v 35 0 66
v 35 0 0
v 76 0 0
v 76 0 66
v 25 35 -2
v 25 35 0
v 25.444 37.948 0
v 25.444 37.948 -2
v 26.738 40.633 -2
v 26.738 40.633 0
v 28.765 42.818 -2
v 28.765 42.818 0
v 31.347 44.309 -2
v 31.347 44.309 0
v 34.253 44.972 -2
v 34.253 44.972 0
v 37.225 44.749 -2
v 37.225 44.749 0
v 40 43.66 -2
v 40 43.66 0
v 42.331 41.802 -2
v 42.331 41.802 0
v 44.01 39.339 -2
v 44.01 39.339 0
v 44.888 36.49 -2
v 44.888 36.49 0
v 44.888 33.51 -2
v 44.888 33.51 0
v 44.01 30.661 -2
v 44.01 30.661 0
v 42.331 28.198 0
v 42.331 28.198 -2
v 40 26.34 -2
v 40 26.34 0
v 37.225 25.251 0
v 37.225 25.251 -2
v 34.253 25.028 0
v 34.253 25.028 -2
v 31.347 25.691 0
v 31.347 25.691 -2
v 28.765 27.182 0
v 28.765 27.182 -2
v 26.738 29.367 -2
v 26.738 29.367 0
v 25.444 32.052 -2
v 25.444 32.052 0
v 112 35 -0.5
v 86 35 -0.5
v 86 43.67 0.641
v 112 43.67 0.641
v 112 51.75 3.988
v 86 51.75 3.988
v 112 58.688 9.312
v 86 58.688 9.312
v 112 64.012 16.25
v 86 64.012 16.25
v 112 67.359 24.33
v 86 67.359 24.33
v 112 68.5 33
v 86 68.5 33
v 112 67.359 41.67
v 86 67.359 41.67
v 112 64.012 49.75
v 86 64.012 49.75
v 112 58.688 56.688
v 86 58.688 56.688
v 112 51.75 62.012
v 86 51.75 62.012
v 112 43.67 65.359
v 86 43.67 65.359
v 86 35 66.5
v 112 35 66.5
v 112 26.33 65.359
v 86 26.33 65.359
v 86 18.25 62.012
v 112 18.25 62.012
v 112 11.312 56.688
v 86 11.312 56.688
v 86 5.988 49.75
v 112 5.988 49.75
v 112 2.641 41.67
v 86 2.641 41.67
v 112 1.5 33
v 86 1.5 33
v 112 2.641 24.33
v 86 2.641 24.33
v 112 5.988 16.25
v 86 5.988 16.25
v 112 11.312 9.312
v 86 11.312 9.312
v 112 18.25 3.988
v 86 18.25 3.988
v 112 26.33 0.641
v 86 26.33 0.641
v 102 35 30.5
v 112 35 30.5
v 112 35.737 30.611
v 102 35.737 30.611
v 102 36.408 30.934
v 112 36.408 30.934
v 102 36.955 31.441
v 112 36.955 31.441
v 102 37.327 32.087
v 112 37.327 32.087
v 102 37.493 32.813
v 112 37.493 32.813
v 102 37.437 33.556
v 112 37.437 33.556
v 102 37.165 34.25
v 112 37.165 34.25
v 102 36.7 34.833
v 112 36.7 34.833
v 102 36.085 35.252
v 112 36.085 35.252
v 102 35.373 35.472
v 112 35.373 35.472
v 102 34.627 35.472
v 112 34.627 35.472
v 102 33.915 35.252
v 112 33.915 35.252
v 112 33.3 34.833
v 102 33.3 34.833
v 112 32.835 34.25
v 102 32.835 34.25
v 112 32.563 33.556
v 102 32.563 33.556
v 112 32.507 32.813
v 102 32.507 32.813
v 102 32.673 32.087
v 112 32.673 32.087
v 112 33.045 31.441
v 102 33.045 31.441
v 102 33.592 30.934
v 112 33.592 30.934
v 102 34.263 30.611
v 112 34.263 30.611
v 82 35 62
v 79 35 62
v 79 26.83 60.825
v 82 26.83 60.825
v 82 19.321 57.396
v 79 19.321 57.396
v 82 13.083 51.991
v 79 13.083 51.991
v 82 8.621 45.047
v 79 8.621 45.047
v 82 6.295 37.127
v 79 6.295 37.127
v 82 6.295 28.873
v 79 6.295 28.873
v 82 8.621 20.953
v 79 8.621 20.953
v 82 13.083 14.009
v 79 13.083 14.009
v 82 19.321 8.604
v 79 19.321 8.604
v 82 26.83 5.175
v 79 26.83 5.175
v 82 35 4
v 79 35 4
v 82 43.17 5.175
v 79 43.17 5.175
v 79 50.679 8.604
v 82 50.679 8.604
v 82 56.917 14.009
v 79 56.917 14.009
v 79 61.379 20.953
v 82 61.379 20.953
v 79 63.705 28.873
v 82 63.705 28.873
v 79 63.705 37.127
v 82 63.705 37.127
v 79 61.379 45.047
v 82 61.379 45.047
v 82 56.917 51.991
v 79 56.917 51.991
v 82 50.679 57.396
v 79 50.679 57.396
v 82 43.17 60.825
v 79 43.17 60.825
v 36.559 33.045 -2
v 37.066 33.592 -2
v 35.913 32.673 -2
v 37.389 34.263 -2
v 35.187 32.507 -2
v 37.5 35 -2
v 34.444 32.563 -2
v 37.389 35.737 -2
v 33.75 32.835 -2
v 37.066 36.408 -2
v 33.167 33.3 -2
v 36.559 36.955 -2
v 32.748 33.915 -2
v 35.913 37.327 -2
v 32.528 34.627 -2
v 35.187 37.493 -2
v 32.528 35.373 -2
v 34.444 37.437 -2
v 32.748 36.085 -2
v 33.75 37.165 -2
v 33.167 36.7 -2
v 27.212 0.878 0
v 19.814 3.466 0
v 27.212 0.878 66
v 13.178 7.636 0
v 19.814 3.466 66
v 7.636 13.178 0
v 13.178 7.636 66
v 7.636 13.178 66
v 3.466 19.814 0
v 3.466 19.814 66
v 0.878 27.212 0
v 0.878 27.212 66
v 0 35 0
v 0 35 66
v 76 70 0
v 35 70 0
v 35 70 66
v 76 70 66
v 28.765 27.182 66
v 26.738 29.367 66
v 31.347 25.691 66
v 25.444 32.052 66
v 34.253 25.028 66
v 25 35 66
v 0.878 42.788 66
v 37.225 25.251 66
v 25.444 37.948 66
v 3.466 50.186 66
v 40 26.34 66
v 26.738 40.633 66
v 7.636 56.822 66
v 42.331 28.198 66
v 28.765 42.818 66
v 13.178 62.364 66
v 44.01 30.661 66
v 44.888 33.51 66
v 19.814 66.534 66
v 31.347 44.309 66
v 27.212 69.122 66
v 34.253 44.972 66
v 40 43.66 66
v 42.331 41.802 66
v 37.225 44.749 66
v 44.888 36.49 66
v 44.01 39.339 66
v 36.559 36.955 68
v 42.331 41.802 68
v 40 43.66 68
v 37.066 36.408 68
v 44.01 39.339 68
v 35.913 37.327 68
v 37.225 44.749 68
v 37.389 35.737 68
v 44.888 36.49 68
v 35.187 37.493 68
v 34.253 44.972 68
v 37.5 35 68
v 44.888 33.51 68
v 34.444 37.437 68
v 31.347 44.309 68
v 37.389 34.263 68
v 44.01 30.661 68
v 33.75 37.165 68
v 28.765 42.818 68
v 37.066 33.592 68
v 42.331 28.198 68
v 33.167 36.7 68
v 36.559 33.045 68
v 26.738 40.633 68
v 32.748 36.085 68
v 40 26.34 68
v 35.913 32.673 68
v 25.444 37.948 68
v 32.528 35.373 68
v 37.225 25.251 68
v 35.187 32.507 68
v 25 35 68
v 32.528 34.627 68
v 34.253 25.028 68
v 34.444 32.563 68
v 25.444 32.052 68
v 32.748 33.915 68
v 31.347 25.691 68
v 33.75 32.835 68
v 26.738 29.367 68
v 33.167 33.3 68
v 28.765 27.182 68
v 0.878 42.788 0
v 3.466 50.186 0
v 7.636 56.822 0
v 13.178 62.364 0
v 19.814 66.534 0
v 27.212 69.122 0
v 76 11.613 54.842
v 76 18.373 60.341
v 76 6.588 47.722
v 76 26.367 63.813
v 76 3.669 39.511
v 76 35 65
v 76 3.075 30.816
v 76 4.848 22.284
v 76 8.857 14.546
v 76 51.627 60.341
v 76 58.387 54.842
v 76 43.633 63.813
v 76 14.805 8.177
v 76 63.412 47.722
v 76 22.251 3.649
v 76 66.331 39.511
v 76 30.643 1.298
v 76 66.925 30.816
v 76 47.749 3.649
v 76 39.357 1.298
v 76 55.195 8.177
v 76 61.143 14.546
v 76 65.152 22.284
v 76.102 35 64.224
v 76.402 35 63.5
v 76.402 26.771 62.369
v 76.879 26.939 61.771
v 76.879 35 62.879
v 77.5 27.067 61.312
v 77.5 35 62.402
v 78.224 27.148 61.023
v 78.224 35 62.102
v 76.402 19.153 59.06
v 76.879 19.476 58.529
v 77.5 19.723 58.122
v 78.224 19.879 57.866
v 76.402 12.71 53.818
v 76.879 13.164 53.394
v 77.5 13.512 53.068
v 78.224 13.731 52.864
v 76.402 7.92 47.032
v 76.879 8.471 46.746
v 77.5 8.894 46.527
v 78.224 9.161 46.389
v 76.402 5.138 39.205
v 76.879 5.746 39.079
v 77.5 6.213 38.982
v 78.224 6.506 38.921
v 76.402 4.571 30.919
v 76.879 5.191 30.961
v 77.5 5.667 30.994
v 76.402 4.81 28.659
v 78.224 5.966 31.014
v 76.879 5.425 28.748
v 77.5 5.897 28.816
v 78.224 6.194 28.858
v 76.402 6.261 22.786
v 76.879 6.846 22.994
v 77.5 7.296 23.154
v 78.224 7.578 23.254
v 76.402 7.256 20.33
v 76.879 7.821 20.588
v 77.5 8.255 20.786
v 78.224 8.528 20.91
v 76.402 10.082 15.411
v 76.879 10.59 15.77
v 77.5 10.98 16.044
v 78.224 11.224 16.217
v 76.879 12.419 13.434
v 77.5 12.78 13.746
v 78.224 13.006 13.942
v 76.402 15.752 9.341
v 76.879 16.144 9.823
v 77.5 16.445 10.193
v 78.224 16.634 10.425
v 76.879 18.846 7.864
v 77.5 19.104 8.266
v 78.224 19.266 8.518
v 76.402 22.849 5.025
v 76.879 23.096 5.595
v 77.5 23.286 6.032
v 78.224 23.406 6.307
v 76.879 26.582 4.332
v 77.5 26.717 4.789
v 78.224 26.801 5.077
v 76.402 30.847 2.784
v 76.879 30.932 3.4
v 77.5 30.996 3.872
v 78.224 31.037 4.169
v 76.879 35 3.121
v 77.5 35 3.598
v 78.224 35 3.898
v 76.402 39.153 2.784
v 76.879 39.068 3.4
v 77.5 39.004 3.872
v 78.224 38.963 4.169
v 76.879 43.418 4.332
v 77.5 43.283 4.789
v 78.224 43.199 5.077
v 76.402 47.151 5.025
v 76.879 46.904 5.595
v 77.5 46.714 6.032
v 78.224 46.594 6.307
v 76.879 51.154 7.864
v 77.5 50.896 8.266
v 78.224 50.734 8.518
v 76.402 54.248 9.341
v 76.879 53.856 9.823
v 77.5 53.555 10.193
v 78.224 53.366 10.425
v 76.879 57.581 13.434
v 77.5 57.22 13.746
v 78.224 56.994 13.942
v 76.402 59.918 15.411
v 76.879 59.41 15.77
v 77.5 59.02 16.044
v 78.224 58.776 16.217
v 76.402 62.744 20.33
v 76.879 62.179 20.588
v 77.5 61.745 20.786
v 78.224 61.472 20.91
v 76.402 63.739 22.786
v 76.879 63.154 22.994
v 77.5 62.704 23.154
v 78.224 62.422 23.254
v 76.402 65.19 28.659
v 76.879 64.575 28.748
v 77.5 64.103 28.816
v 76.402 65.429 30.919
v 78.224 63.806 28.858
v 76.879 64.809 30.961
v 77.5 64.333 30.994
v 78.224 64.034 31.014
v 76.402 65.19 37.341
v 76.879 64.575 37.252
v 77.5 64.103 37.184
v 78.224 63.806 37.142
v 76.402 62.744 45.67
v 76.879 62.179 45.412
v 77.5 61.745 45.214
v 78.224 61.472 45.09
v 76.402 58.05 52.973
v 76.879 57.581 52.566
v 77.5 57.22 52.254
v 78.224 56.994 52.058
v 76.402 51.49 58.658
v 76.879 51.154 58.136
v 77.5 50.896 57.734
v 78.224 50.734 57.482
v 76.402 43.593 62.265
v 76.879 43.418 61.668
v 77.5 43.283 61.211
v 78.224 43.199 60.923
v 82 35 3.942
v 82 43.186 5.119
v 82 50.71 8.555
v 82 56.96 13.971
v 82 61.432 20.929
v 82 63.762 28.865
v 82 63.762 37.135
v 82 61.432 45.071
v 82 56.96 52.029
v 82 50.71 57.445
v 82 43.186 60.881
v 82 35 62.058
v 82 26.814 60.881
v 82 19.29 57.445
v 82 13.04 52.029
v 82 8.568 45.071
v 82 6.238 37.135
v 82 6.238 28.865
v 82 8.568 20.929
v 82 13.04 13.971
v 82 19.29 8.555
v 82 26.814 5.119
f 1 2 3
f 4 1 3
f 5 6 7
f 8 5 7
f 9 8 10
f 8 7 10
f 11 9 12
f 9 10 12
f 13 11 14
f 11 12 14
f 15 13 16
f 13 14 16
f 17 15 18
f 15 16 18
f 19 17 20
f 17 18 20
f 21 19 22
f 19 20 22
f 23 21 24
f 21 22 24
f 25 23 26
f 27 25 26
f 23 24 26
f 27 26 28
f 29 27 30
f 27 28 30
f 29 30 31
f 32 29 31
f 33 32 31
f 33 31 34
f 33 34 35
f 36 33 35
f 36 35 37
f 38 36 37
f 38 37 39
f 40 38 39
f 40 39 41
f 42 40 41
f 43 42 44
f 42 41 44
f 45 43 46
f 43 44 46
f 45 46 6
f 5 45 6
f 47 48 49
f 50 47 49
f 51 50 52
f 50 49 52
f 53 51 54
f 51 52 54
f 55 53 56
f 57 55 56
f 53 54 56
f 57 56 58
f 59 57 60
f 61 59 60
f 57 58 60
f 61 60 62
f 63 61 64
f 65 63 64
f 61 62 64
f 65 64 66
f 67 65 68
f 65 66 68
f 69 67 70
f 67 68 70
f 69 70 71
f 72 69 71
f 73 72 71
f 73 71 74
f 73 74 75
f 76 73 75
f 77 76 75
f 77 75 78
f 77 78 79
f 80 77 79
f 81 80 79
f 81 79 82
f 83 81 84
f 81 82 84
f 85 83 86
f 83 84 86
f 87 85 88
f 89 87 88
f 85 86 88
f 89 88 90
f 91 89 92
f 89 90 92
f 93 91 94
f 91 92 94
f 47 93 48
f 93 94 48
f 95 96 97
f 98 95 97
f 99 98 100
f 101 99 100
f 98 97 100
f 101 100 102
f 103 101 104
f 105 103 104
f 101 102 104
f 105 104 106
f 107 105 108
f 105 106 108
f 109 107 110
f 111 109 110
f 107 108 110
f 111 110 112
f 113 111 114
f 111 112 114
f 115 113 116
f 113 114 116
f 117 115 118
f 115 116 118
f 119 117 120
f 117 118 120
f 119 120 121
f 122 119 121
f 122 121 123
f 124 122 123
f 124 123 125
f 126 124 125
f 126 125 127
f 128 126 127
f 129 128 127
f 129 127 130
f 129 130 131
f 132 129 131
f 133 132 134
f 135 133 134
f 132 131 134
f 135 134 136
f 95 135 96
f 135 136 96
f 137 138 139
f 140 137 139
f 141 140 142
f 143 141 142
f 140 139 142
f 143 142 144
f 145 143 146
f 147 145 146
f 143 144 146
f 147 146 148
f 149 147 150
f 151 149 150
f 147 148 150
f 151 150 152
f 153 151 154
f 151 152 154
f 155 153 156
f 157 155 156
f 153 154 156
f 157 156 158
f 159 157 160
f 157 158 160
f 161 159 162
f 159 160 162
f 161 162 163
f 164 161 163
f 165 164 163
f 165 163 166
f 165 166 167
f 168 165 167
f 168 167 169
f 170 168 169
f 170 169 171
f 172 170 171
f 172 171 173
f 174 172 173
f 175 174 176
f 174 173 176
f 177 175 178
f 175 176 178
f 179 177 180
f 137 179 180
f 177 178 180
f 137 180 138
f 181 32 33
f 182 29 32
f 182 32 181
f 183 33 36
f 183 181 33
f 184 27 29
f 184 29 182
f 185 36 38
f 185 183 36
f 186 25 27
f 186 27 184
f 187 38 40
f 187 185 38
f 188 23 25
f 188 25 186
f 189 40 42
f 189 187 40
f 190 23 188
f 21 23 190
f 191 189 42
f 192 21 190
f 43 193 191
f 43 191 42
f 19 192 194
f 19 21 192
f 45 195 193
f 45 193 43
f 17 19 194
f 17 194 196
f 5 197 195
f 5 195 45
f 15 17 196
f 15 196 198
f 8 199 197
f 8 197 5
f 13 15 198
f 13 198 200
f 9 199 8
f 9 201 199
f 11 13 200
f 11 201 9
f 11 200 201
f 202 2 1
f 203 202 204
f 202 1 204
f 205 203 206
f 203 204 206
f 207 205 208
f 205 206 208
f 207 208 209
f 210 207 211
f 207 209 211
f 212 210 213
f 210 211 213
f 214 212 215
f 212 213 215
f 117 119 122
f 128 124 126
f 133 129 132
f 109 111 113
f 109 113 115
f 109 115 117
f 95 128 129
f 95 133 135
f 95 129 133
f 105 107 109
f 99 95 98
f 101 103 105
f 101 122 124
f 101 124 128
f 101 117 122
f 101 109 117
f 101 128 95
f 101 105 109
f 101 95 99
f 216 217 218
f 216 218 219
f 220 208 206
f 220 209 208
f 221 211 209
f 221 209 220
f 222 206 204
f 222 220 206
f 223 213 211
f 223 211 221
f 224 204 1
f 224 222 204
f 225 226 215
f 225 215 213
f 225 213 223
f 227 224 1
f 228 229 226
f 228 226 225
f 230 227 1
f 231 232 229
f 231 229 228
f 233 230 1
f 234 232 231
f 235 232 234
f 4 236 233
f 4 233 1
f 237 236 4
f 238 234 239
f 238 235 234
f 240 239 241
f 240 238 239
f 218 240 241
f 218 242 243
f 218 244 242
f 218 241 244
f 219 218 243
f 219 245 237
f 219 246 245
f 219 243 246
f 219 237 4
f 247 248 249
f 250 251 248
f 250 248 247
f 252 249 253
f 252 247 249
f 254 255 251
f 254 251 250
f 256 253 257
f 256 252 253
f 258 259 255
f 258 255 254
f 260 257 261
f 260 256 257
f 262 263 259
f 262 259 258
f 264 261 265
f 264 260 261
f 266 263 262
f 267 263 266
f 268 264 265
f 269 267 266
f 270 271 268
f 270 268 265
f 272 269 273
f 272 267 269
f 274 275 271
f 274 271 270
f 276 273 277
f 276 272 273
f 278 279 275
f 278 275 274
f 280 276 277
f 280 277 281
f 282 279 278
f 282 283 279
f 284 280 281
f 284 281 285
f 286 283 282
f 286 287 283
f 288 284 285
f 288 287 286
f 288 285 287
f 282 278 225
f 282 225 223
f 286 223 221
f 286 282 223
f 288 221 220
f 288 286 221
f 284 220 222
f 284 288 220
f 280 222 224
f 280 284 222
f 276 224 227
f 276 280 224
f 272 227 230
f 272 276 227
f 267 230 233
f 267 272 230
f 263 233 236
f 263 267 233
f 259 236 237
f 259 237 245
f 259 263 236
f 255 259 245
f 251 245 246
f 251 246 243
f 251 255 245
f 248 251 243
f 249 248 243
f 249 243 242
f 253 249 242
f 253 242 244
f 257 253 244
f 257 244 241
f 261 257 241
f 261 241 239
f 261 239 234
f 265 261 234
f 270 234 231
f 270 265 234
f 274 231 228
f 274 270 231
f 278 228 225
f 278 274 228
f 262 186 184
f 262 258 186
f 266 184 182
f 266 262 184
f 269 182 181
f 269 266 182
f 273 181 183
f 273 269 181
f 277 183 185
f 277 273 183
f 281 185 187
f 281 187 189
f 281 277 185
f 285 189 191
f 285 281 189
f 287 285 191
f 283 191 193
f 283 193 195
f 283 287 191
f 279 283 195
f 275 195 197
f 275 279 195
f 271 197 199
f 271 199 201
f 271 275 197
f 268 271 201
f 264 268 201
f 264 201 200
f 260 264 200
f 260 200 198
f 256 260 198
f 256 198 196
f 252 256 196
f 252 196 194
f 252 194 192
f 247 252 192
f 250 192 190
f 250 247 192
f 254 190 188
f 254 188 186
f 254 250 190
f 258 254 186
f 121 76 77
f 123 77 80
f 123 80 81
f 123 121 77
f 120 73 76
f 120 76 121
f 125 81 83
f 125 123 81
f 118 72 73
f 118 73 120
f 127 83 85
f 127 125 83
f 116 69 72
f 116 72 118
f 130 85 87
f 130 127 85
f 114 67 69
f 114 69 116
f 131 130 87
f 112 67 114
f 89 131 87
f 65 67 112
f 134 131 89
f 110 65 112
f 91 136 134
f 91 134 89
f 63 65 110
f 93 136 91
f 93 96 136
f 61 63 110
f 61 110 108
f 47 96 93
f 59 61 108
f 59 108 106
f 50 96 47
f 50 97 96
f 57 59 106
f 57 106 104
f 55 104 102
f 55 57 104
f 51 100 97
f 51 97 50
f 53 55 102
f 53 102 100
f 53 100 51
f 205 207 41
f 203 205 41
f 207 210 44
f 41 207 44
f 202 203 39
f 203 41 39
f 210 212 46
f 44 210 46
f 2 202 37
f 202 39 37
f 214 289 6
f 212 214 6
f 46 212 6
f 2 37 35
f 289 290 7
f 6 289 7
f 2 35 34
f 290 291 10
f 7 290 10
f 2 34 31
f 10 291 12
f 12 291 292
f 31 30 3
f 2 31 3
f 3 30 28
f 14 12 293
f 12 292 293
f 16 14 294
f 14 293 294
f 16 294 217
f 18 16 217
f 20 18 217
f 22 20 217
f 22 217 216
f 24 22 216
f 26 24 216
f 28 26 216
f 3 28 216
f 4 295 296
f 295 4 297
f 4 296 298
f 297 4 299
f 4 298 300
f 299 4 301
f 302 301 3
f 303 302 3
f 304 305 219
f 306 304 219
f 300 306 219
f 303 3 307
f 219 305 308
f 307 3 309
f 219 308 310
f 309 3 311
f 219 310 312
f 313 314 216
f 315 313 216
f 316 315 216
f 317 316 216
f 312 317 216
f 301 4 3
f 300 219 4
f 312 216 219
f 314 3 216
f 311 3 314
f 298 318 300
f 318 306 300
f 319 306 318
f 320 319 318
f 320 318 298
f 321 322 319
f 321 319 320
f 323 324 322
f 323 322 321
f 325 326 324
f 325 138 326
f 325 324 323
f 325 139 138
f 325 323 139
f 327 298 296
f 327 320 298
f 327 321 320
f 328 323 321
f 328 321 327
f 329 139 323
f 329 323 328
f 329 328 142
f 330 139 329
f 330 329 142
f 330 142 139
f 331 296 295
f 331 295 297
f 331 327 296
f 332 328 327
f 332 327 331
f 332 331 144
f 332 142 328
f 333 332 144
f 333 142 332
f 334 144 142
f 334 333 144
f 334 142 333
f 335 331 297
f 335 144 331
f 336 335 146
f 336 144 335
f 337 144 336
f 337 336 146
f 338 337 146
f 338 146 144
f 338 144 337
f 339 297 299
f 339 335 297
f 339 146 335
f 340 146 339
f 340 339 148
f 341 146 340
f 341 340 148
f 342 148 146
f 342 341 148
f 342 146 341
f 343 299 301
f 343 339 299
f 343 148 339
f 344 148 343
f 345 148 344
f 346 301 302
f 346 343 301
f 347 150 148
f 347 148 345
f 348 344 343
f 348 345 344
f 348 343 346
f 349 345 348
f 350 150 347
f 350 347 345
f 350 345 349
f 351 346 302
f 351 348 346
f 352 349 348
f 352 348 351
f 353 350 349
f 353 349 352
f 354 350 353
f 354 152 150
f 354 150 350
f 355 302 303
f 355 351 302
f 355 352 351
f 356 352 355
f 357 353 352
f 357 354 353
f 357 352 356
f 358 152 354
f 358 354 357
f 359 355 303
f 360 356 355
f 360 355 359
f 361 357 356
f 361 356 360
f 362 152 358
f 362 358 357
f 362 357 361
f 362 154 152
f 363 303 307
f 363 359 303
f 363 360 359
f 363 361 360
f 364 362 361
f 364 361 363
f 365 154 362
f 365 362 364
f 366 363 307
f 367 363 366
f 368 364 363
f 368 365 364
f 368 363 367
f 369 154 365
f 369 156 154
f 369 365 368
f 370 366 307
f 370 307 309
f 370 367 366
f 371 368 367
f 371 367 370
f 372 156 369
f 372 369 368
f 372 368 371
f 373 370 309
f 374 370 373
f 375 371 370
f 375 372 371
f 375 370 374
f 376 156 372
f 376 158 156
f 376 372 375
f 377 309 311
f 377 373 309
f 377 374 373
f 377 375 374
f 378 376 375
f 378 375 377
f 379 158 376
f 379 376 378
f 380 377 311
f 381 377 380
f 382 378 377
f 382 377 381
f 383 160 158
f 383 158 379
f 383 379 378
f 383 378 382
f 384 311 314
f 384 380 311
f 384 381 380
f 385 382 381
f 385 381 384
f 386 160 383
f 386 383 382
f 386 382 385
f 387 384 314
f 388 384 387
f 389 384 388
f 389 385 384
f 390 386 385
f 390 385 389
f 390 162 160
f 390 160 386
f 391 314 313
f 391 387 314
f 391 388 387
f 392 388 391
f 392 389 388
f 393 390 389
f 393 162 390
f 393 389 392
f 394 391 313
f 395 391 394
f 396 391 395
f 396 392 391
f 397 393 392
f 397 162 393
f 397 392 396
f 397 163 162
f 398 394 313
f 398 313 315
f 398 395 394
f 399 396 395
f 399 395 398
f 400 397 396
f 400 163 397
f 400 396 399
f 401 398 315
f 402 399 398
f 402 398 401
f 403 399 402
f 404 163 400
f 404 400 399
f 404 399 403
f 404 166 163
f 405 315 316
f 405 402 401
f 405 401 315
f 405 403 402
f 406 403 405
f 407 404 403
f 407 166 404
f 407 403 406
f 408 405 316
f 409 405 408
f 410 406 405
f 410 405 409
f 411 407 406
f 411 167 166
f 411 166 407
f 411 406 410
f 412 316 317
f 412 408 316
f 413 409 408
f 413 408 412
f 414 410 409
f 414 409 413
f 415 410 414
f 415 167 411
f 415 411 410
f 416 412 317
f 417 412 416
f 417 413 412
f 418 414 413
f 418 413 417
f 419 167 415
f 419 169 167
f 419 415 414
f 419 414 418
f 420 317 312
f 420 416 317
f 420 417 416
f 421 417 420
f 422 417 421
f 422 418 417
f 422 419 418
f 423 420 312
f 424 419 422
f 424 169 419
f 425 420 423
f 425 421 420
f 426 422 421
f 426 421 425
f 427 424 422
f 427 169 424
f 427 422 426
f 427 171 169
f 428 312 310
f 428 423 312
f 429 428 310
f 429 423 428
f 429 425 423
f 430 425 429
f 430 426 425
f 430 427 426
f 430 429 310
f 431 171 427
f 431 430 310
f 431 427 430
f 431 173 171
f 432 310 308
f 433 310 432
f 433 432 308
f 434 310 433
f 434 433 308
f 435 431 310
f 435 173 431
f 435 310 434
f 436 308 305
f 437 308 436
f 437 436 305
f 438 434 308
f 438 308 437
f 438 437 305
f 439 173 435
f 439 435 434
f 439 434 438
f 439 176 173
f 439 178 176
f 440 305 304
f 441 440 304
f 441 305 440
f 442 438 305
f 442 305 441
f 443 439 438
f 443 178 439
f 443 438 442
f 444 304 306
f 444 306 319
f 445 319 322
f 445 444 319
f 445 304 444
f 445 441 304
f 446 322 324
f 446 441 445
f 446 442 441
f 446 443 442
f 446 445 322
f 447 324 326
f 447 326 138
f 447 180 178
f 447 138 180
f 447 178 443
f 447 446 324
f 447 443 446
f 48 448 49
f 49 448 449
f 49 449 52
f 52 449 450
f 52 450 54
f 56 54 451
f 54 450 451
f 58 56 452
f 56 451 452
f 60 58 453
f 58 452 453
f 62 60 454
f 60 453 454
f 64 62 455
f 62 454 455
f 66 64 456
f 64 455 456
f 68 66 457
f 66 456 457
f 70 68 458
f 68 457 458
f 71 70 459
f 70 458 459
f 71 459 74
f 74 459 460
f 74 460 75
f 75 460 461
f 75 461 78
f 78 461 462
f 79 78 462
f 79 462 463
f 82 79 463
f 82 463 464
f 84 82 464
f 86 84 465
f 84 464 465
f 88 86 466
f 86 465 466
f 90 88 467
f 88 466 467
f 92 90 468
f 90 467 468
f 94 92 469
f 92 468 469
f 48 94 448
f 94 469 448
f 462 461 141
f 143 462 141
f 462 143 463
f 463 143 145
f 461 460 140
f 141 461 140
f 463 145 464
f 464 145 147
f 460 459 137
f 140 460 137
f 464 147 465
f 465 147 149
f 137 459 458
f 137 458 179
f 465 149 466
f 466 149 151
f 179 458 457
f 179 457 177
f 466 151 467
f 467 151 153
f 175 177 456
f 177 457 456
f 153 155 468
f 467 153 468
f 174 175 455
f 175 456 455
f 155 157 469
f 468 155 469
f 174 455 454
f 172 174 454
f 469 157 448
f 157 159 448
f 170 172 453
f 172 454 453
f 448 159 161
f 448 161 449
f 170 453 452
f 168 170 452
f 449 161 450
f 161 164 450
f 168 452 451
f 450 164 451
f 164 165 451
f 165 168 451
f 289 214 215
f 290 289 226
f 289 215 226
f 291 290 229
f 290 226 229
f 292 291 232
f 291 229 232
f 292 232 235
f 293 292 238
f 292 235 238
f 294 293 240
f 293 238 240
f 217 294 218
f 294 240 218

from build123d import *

# Parameters (mm, degrees)
SKETCH_1_W          = 76
SKETCH_1_H          = 70
EXTRUDE_1_DEPTH     = 66
CUT_EXTRUDE_1_DEPTH = 123.605056992
SKETCH_3_R          = 2.5
CUT_EXTRUDE_2_DEPTH = 123.605056992
SKETCH_4_R          = 29
EXTRUDE_2_DEPTH     = 6
FILLET_1_R          = 3
SKETCH_5_R          = 33.5
EXTRUDE_3_DEPTH     = 30
CHAMFER_2_SIZE      = 4
CHAMFER_2_SIZE2     = 4.442450059
SKETCH_6_R          = 2.5
CUT_EXTRUDE_3_DEPTH = 10
EXTRUDE_START       = 2
SKETCH_7_R          = 10
SKETCH_7_R_2        = 2.5
EXTRUDE_4_DEPTH     = 2
SKETCH_8_R          = 10
SKETCH_8_R_2        = 2.5
EXTRUDE_5_DEPTH     = 2


with BuildPart() as part:
    # ｽｹｯﾁ1 → 押し出し1 (new body)
    with BuildSketch(Plane.XY):
        with Locations((38, 35)):
            Rectangle(SKETCH_1_W, SKETCH_1_H)
    extrude(amount=EXTRUDE_1_DEPTH)

    # ｽｹｯﾁ2 → ｶｯﾄ - 押し出し1 (cut, through all)
    with BuildSketch(Plane.XY.offset(66)):
        with BuildLine():
            ThreePointArc((0, 35), (10.251262658, 59.748737342), (35, 70))
            Line((35, 70), (0, 70))
            Line((0, 70), (0, 35))
        make_face()
        with BuildLine():
            Line((0, 0), (35, 0))
            ThreePointArc((35, 0), (10.251262658, 10.251262658), (0, 35))
            Line((0, 35), (0, 0))
        make_face()
    extrude(amount=-CUT_EXTRUDE_1_DEPTH, mode=Mode.SUBTRACT)

    # ｽｹｯﾁ3 → ｶｯﾄ - 押し出し2 (cut, through all)
    with BuildSketch(Plane.XY.offset(66)):
        with Locations((35, 35)):
            Circle(SKETCH_3_R)
    extrude(amount=-CUT_EXTRUDE_2_DEPTH, mode=Mode.SUBTRACT)

    # ｽｹｯﾁ4 → 押し出し2 (add)
    with BuildSketch(Plane(origin=(76, 0, 0), x_dir=(0, 0, -1), z_dir=(1, 0, 0))):
        with Locations(Location((-33, 35, 0), (0, 0, 180))):
            Circle(SKETCH_4_R)
    extrude(amount=EXTRUDE_2_DEPTH)

    # ﾌｨﾚｯﾄ1
    fillet_1_edges = [part.edges().sort_by_distance(p)[0] for p in [
        (76, 35, 4),
    ]]
    fillet(fillet_1_edges, radius=FILLET_1_R)

    # ｽｹｯﾁ5 → 押し出し3 (add)
    with BuildSketch(Plane(origin=(82, 0, 0), x_dir=(0, 0, -1), z_dir=(1, 0, 0))):
        with Locations((-33, 35)):
            Circle(SKETCH_5_R)
    extrude(amount=EXTRUDE_3_DEPTH)

    # 面取り2
    chamfer_2_edges = [part.edges().sort_by_distance(p)[0] for p in [
        (82, 35, 66.5),
    ]]
    chamfer_2_side = [part.faces().sort_by_distance(p)[0] for p in [
        (97, 35, 66.5),
    ]]
    chamfer(chamfer_2_edges, length=CHAMFER_2_SIZE, length2=CHAMFER_2_SIZE2, reference=chamfer_2_side[0])

    # ｽｹｯﾁ6 → ｶｯﾄ - 押し出し3 (cut)
    with BuildSketch(Plane(origin=(112, 0, 0), x_dir=(0, 0, -1), z_dir=(1, 0, 0))):
        with Locations((-33, 35)):
            Circle(SKETCH_6_R)
    extrude(amount=-CUT_EXTRUDE_3_DEPTH, mode=Mode.SUBTRACT)

    # ｽｹｯﾁ7 → 押し出し4 (add)
    with BuildSketch(Plane.XY.offset(66).offset(EXTRUDE_START)):
        with Locations(Location((35, 35, 0), (0, 0, 180))):
            Circle(SKETCH_7_R)
        with Locations((35, 35)):
            Circle(SKETCH_7_R_2, mode=Mode.SUBTRACT)
    extrude(amount=-EXTRUDE_4_DEPTH)

    # ｽｹｯﾁ8 → 押し出し5 (add)
    with BuildSketch(Plane(origin=(0, 0, 0), x_dir=(-1, 0, 0), z_dir=(0, 0, -1))):
        with Locations((-35, 35)):
            Circle(SKETCH_8_R)
        with Locations(Location((-35, 35, 0), (0, 0, 180))):
            Circle(SKETCH_8_R_2, mode=Mode.SUBTRACT)
    extrude(amount=EXTRUDE_5_DEPTH)


solid = part.part
